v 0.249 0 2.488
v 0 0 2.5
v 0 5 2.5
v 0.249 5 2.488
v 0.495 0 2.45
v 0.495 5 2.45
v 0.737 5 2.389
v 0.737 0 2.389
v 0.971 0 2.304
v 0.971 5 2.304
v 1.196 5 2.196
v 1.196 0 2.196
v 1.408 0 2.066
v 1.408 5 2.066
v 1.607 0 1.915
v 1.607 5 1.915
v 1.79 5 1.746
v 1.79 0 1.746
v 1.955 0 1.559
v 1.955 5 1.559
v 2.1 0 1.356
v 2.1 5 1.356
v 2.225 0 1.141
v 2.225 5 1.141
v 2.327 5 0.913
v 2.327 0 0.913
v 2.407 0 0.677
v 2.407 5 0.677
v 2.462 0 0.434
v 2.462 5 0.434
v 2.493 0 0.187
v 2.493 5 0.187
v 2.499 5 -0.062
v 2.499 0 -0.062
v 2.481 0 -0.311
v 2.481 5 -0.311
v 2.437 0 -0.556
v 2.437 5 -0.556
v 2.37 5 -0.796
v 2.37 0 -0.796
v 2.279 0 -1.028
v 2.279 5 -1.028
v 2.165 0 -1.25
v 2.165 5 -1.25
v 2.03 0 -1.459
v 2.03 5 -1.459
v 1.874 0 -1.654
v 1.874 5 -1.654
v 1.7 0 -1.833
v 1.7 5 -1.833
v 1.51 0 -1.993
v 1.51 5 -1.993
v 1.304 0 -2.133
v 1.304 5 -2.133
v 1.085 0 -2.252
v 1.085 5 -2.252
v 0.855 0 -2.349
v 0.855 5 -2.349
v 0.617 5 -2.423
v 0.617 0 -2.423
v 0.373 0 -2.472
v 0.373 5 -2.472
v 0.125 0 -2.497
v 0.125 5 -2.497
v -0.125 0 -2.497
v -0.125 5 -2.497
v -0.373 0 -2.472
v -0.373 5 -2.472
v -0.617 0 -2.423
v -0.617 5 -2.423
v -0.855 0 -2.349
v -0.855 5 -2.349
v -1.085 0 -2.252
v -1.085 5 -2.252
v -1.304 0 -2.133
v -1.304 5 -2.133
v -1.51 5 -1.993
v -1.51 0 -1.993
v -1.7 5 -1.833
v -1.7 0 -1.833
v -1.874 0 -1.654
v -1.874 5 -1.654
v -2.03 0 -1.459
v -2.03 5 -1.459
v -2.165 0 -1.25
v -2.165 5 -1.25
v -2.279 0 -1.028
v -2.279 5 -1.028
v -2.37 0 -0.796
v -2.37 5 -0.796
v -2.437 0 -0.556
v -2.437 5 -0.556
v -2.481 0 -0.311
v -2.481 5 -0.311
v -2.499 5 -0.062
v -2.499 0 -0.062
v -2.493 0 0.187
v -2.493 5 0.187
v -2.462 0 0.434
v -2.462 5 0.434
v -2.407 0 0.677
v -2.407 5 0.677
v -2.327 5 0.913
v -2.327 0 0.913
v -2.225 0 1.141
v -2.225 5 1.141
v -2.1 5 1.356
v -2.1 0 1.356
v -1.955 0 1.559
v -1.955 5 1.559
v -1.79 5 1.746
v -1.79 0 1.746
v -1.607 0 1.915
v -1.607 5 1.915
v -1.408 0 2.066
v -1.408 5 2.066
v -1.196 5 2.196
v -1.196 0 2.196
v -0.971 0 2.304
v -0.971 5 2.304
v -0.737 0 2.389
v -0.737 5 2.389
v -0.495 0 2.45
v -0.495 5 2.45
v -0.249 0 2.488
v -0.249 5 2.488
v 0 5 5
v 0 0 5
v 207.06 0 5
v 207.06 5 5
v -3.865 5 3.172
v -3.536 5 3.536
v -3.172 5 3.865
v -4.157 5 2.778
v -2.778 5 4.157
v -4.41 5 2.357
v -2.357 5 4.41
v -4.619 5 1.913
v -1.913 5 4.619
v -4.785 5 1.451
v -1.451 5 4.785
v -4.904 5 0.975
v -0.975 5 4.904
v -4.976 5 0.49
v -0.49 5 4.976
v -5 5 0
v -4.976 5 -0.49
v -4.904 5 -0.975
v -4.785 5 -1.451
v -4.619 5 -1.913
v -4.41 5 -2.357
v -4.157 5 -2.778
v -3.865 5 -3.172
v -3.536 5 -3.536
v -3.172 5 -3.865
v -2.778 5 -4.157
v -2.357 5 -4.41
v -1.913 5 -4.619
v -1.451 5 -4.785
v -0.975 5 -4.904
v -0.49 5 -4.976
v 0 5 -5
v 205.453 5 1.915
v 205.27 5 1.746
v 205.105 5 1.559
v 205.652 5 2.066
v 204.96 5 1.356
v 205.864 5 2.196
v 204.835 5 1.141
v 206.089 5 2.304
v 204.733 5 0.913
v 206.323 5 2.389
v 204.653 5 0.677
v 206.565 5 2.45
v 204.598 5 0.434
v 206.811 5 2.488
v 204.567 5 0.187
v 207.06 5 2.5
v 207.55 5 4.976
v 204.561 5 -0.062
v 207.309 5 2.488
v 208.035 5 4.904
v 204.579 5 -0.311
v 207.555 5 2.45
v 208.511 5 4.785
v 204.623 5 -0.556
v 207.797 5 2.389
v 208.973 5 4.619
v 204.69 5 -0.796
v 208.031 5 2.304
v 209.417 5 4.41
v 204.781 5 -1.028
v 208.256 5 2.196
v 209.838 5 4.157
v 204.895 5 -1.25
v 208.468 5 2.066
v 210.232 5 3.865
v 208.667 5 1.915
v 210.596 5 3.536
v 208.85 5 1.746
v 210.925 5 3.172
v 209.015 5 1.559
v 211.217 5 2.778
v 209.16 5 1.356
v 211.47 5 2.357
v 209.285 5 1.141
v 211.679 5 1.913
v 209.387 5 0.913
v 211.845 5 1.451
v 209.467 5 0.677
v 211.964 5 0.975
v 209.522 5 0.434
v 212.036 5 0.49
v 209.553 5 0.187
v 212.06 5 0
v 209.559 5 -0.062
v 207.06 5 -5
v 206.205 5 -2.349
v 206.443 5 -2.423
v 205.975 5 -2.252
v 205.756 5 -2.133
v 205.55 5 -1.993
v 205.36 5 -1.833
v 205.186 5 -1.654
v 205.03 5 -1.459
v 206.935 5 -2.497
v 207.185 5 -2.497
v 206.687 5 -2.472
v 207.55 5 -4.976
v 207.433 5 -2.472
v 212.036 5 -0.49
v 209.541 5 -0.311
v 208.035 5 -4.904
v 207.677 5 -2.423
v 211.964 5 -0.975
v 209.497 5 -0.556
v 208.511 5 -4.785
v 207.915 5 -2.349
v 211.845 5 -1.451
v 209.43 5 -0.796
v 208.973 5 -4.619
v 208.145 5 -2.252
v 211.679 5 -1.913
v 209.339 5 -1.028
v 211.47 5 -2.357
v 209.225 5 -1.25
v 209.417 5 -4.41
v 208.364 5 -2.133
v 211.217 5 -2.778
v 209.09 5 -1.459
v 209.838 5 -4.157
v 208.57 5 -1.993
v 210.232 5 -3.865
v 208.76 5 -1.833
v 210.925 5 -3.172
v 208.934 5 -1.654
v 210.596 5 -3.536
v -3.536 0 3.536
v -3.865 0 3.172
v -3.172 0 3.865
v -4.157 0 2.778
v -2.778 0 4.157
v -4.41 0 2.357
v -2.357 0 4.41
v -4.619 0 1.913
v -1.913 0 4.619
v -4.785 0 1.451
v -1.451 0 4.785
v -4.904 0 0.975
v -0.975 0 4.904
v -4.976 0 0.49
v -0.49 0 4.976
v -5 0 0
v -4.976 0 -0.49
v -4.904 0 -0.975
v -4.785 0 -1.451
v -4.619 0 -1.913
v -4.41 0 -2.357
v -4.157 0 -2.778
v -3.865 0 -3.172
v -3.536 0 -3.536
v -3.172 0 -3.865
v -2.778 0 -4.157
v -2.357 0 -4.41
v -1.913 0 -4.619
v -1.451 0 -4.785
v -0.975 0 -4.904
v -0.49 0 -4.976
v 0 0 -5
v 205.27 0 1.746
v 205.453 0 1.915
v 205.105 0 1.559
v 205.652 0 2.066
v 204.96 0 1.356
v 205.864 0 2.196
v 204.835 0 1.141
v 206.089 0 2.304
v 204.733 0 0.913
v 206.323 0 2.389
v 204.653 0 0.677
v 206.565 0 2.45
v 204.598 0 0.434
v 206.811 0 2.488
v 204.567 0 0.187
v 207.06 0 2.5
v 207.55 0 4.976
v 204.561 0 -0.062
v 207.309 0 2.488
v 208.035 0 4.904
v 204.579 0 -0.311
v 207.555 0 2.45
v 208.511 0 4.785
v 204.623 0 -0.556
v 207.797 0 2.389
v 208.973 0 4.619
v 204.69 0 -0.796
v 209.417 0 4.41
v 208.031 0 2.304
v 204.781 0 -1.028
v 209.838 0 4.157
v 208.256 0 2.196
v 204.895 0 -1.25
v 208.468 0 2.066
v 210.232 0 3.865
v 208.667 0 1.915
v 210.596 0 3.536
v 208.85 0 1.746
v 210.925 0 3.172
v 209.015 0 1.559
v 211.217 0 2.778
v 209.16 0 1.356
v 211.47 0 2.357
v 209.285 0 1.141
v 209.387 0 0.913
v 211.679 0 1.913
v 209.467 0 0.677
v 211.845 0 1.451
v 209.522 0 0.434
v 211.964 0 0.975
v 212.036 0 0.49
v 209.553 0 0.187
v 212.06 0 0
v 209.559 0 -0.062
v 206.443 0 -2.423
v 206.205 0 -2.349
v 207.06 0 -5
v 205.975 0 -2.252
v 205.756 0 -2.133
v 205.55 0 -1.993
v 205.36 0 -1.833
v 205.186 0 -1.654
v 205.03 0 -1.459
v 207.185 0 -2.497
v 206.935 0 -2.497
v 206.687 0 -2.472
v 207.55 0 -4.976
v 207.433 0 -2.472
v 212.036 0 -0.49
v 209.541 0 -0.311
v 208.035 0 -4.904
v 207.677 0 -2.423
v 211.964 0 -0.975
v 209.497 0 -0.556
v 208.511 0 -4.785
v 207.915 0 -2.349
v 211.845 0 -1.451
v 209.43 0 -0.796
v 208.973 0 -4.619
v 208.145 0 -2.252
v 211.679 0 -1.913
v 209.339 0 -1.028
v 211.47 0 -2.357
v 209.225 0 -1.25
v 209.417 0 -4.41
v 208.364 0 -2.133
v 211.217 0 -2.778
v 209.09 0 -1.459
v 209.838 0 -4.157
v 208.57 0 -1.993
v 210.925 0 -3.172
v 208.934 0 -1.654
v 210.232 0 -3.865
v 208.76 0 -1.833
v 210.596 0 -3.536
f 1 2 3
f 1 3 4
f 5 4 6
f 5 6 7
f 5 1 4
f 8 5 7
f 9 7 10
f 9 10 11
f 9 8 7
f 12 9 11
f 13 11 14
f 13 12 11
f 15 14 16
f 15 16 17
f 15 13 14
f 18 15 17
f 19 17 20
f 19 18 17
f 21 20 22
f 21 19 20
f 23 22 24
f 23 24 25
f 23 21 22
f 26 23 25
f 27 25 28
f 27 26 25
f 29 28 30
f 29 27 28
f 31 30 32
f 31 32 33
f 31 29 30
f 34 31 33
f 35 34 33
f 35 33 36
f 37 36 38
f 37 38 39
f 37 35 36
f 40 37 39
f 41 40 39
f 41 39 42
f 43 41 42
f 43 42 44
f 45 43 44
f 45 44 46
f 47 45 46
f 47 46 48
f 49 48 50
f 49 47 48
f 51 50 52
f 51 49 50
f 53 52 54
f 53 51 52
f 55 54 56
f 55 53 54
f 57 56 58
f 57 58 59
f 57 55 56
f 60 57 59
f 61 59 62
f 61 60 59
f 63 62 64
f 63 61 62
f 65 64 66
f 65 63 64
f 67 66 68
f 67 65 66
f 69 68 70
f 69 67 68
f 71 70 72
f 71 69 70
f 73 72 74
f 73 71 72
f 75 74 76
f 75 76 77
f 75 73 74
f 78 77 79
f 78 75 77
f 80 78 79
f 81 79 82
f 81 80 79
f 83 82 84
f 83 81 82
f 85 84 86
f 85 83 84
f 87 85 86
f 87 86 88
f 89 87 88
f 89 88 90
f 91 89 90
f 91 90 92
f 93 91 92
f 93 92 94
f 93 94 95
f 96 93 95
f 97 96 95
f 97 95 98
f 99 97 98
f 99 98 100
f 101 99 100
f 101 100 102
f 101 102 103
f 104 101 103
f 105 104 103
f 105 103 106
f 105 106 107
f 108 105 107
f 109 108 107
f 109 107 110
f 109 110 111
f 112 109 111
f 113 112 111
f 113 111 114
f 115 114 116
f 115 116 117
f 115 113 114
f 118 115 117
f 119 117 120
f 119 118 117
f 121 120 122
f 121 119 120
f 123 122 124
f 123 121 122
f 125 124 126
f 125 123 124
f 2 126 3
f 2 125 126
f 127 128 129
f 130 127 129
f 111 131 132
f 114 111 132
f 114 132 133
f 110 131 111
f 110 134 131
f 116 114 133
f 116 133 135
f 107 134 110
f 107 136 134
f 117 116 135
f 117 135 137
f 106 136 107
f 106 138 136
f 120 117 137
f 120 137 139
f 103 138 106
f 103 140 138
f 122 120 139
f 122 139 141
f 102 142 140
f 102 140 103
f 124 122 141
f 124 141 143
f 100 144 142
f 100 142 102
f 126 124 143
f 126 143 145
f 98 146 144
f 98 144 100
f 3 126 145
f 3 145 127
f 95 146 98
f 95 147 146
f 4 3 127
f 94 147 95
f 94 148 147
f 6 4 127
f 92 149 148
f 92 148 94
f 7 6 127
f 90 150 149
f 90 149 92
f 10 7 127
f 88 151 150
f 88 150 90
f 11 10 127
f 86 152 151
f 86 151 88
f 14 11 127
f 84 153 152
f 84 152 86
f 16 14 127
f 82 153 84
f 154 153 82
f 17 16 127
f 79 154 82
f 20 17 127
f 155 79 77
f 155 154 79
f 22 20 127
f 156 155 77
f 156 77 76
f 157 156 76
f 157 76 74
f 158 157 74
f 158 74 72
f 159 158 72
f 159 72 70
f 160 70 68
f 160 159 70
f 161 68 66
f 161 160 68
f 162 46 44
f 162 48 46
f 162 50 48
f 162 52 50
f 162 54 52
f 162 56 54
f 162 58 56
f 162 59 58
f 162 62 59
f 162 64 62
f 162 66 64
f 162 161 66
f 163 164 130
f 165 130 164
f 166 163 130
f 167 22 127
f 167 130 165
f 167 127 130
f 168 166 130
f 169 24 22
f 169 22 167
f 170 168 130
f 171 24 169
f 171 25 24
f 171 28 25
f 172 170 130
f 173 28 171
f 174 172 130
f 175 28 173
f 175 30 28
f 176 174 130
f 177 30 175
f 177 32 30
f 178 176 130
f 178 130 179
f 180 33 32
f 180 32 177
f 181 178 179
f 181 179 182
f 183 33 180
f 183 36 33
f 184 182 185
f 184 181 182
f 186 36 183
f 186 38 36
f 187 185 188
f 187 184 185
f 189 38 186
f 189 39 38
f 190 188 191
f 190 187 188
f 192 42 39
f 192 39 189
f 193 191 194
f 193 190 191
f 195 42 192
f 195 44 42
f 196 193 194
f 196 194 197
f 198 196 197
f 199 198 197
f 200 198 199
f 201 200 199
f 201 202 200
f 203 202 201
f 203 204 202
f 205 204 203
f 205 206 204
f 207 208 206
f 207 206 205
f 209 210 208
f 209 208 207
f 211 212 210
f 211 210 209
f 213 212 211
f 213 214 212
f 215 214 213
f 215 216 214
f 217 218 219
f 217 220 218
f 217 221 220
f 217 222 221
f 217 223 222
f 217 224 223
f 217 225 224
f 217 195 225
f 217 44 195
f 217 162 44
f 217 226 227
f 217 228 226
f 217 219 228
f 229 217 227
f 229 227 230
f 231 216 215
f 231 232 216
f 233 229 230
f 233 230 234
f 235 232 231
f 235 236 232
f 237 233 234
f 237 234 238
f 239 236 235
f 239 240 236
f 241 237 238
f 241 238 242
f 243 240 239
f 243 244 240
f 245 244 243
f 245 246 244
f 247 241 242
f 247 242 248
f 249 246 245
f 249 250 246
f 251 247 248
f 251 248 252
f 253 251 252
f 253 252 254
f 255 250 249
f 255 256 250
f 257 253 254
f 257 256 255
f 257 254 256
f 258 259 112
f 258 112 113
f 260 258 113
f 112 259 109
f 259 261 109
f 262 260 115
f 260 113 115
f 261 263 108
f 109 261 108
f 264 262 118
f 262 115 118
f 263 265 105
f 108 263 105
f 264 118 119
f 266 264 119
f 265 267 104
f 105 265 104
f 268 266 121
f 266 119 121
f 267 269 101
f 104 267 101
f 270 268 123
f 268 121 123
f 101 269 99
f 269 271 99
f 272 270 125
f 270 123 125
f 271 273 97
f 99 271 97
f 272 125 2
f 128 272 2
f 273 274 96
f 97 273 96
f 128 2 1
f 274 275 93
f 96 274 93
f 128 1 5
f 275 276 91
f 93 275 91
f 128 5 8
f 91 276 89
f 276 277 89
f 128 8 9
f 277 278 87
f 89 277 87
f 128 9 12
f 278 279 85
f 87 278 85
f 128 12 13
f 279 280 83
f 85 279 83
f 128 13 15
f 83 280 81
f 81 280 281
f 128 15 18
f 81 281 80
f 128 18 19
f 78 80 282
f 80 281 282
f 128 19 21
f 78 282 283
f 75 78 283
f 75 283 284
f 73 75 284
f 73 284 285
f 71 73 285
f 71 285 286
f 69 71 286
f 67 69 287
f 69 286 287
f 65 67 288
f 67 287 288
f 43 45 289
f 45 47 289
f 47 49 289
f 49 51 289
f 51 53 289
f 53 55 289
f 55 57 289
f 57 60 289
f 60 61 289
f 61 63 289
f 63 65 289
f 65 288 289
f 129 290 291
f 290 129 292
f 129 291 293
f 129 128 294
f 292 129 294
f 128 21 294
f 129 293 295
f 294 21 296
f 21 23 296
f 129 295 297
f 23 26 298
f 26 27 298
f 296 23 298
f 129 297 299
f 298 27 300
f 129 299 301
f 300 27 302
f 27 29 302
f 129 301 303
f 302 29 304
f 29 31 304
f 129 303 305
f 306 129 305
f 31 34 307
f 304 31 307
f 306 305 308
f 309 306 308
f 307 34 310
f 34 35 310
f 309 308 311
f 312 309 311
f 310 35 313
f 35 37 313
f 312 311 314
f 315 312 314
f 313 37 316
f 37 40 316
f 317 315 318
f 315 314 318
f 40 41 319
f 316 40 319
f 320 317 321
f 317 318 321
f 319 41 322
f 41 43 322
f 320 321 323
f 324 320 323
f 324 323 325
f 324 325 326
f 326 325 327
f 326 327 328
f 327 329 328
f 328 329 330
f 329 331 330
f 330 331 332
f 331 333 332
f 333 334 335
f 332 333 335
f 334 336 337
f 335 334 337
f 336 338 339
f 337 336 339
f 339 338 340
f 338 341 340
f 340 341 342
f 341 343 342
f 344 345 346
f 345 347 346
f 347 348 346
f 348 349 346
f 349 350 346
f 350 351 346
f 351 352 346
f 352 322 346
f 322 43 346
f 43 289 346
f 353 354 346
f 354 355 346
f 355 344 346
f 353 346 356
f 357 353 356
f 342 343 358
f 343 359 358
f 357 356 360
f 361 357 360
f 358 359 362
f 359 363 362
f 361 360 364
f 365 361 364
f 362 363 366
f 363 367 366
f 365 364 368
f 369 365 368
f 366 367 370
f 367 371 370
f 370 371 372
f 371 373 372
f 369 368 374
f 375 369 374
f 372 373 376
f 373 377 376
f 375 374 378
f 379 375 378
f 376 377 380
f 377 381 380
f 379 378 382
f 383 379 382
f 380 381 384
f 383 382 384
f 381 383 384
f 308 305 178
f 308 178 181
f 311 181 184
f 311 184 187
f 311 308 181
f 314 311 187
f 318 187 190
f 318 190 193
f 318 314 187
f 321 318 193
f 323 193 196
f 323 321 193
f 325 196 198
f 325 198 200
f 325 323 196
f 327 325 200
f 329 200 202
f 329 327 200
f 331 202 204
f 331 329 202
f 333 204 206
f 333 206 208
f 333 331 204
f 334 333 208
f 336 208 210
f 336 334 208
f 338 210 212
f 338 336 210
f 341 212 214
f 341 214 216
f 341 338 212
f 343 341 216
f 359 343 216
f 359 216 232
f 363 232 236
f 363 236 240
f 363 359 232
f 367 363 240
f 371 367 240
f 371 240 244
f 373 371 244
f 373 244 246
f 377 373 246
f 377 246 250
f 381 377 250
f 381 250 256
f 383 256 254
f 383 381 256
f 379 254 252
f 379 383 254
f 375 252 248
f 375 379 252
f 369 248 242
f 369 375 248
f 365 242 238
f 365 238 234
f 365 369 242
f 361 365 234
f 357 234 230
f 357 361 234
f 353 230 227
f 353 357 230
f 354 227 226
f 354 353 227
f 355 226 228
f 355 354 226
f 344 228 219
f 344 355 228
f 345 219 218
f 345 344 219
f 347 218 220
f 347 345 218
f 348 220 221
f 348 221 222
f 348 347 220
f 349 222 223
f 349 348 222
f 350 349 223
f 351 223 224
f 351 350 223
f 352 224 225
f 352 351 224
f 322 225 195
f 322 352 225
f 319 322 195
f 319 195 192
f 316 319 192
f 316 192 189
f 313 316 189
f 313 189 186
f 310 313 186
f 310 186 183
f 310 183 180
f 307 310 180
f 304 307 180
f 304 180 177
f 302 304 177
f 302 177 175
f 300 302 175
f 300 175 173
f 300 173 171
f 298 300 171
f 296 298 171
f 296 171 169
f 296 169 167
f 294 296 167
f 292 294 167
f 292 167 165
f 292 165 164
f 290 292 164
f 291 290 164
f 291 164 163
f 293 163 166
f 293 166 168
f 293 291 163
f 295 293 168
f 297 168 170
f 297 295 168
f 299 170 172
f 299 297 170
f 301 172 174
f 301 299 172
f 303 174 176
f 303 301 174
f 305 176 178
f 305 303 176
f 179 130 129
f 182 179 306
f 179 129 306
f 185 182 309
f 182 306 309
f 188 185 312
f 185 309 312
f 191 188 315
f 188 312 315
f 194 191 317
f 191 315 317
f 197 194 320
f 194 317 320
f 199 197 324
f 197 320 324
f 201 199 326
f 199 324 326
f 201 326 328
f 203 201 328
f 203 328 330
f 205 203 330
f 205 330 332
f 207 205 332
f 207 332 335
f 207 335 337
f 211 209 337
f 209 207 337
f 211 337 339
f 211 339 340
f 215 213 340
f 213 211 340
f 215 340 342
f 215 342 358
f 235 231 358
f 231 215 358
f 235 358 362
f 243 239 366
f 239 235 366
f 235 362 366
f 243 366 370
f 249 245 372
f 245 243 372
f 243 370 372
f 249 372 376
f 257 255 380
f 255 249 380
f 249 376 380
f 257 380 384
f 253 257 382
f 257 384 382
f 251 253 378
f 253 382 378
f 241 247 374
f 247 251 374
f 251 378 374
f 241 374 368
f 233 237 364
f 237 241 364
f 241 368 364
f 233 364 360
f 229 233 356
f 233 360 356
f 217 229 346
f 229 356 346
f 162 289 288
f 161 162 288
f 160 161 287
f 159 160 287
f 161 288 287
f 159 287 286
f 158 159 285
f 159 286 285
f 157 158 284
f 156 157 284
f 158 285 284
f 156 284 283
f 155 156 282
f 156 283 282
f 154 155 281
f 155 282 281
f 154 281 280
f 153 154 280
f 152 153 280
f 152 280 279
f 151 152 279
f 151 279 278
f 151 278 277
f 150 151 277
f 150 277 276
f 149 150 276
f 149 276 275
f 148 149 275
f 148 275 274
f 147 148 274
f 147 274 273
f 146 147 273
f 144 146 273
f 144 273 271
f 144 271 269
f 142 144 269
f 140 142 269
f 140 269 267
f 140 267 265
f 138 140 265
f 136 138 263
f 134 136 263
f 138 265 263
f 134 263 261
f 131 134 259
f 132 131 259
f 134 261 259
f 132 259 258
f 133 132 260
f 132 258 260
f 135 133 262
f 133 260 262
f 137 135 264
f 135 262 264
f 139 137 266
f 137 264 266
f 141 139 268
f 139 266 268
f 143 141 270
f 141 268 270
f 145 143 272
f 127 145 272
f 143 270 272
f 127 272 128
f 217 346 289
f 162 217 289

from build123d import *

# Parameters (mm, degrees)
SKETCH_2_R      = 5
SKETCH_2_R_2    = 2.5
EXTRUDE_1_DEPTH = 5


with BuildPart() as part:
    # 草图2 → 凸台-拉伸1 (new body)
    # profile 1 of 3: a face of its own
    with BuildSketch(Plane(origin=(0, 0, 0), x_dir=(1, 0, 0), z_dir=(0, 1, 0))):
        with BuildLine():
            ThreePointArc((5, 0), (3.535533906, -3.535533906), (0, -5))
            Line((0, -5), (207.06, -5))
            ThreePointArc((207.06, -5), (202.06, 0), (207.06, 5))
            Line((207.06, 5), (0, 5))
            ThreePointArc((0, 5), (3.535533906, 3.535533906), (5, 0))
        make_face()
    # profile 2 of 3: a face of its own
    with BuildSketch(Plane(origin=(0, 0, 0), x_dir=(1, 0, 0), z_dir=(0, 1, 0))):
        Circle(SKETCH_2_R)
        with Locations(Location((0, 0, 0), (0, 0, 270))):
            Circle(SKETCH_2_R_2, mode=Mode.SUBTRACT)
    # profile 3 of 3: a face of its own
    with BuildSketch(Plane(origin=(0, 0, 0), x_dir=(1, 0, 0), z_dir=(0, 1, 0))):
        with Locations((207.06, 0)):
            Circle(SKETCH_2_R)
        with Locations(Location((207.06, 0, 0), (0, 0, 270))):
            Circle(SKETCH_2_R_2, mode=Mode.SUBTRACT)
    extrude(amount=EXTRUDE_1_DEPTH)


solid = part.part
